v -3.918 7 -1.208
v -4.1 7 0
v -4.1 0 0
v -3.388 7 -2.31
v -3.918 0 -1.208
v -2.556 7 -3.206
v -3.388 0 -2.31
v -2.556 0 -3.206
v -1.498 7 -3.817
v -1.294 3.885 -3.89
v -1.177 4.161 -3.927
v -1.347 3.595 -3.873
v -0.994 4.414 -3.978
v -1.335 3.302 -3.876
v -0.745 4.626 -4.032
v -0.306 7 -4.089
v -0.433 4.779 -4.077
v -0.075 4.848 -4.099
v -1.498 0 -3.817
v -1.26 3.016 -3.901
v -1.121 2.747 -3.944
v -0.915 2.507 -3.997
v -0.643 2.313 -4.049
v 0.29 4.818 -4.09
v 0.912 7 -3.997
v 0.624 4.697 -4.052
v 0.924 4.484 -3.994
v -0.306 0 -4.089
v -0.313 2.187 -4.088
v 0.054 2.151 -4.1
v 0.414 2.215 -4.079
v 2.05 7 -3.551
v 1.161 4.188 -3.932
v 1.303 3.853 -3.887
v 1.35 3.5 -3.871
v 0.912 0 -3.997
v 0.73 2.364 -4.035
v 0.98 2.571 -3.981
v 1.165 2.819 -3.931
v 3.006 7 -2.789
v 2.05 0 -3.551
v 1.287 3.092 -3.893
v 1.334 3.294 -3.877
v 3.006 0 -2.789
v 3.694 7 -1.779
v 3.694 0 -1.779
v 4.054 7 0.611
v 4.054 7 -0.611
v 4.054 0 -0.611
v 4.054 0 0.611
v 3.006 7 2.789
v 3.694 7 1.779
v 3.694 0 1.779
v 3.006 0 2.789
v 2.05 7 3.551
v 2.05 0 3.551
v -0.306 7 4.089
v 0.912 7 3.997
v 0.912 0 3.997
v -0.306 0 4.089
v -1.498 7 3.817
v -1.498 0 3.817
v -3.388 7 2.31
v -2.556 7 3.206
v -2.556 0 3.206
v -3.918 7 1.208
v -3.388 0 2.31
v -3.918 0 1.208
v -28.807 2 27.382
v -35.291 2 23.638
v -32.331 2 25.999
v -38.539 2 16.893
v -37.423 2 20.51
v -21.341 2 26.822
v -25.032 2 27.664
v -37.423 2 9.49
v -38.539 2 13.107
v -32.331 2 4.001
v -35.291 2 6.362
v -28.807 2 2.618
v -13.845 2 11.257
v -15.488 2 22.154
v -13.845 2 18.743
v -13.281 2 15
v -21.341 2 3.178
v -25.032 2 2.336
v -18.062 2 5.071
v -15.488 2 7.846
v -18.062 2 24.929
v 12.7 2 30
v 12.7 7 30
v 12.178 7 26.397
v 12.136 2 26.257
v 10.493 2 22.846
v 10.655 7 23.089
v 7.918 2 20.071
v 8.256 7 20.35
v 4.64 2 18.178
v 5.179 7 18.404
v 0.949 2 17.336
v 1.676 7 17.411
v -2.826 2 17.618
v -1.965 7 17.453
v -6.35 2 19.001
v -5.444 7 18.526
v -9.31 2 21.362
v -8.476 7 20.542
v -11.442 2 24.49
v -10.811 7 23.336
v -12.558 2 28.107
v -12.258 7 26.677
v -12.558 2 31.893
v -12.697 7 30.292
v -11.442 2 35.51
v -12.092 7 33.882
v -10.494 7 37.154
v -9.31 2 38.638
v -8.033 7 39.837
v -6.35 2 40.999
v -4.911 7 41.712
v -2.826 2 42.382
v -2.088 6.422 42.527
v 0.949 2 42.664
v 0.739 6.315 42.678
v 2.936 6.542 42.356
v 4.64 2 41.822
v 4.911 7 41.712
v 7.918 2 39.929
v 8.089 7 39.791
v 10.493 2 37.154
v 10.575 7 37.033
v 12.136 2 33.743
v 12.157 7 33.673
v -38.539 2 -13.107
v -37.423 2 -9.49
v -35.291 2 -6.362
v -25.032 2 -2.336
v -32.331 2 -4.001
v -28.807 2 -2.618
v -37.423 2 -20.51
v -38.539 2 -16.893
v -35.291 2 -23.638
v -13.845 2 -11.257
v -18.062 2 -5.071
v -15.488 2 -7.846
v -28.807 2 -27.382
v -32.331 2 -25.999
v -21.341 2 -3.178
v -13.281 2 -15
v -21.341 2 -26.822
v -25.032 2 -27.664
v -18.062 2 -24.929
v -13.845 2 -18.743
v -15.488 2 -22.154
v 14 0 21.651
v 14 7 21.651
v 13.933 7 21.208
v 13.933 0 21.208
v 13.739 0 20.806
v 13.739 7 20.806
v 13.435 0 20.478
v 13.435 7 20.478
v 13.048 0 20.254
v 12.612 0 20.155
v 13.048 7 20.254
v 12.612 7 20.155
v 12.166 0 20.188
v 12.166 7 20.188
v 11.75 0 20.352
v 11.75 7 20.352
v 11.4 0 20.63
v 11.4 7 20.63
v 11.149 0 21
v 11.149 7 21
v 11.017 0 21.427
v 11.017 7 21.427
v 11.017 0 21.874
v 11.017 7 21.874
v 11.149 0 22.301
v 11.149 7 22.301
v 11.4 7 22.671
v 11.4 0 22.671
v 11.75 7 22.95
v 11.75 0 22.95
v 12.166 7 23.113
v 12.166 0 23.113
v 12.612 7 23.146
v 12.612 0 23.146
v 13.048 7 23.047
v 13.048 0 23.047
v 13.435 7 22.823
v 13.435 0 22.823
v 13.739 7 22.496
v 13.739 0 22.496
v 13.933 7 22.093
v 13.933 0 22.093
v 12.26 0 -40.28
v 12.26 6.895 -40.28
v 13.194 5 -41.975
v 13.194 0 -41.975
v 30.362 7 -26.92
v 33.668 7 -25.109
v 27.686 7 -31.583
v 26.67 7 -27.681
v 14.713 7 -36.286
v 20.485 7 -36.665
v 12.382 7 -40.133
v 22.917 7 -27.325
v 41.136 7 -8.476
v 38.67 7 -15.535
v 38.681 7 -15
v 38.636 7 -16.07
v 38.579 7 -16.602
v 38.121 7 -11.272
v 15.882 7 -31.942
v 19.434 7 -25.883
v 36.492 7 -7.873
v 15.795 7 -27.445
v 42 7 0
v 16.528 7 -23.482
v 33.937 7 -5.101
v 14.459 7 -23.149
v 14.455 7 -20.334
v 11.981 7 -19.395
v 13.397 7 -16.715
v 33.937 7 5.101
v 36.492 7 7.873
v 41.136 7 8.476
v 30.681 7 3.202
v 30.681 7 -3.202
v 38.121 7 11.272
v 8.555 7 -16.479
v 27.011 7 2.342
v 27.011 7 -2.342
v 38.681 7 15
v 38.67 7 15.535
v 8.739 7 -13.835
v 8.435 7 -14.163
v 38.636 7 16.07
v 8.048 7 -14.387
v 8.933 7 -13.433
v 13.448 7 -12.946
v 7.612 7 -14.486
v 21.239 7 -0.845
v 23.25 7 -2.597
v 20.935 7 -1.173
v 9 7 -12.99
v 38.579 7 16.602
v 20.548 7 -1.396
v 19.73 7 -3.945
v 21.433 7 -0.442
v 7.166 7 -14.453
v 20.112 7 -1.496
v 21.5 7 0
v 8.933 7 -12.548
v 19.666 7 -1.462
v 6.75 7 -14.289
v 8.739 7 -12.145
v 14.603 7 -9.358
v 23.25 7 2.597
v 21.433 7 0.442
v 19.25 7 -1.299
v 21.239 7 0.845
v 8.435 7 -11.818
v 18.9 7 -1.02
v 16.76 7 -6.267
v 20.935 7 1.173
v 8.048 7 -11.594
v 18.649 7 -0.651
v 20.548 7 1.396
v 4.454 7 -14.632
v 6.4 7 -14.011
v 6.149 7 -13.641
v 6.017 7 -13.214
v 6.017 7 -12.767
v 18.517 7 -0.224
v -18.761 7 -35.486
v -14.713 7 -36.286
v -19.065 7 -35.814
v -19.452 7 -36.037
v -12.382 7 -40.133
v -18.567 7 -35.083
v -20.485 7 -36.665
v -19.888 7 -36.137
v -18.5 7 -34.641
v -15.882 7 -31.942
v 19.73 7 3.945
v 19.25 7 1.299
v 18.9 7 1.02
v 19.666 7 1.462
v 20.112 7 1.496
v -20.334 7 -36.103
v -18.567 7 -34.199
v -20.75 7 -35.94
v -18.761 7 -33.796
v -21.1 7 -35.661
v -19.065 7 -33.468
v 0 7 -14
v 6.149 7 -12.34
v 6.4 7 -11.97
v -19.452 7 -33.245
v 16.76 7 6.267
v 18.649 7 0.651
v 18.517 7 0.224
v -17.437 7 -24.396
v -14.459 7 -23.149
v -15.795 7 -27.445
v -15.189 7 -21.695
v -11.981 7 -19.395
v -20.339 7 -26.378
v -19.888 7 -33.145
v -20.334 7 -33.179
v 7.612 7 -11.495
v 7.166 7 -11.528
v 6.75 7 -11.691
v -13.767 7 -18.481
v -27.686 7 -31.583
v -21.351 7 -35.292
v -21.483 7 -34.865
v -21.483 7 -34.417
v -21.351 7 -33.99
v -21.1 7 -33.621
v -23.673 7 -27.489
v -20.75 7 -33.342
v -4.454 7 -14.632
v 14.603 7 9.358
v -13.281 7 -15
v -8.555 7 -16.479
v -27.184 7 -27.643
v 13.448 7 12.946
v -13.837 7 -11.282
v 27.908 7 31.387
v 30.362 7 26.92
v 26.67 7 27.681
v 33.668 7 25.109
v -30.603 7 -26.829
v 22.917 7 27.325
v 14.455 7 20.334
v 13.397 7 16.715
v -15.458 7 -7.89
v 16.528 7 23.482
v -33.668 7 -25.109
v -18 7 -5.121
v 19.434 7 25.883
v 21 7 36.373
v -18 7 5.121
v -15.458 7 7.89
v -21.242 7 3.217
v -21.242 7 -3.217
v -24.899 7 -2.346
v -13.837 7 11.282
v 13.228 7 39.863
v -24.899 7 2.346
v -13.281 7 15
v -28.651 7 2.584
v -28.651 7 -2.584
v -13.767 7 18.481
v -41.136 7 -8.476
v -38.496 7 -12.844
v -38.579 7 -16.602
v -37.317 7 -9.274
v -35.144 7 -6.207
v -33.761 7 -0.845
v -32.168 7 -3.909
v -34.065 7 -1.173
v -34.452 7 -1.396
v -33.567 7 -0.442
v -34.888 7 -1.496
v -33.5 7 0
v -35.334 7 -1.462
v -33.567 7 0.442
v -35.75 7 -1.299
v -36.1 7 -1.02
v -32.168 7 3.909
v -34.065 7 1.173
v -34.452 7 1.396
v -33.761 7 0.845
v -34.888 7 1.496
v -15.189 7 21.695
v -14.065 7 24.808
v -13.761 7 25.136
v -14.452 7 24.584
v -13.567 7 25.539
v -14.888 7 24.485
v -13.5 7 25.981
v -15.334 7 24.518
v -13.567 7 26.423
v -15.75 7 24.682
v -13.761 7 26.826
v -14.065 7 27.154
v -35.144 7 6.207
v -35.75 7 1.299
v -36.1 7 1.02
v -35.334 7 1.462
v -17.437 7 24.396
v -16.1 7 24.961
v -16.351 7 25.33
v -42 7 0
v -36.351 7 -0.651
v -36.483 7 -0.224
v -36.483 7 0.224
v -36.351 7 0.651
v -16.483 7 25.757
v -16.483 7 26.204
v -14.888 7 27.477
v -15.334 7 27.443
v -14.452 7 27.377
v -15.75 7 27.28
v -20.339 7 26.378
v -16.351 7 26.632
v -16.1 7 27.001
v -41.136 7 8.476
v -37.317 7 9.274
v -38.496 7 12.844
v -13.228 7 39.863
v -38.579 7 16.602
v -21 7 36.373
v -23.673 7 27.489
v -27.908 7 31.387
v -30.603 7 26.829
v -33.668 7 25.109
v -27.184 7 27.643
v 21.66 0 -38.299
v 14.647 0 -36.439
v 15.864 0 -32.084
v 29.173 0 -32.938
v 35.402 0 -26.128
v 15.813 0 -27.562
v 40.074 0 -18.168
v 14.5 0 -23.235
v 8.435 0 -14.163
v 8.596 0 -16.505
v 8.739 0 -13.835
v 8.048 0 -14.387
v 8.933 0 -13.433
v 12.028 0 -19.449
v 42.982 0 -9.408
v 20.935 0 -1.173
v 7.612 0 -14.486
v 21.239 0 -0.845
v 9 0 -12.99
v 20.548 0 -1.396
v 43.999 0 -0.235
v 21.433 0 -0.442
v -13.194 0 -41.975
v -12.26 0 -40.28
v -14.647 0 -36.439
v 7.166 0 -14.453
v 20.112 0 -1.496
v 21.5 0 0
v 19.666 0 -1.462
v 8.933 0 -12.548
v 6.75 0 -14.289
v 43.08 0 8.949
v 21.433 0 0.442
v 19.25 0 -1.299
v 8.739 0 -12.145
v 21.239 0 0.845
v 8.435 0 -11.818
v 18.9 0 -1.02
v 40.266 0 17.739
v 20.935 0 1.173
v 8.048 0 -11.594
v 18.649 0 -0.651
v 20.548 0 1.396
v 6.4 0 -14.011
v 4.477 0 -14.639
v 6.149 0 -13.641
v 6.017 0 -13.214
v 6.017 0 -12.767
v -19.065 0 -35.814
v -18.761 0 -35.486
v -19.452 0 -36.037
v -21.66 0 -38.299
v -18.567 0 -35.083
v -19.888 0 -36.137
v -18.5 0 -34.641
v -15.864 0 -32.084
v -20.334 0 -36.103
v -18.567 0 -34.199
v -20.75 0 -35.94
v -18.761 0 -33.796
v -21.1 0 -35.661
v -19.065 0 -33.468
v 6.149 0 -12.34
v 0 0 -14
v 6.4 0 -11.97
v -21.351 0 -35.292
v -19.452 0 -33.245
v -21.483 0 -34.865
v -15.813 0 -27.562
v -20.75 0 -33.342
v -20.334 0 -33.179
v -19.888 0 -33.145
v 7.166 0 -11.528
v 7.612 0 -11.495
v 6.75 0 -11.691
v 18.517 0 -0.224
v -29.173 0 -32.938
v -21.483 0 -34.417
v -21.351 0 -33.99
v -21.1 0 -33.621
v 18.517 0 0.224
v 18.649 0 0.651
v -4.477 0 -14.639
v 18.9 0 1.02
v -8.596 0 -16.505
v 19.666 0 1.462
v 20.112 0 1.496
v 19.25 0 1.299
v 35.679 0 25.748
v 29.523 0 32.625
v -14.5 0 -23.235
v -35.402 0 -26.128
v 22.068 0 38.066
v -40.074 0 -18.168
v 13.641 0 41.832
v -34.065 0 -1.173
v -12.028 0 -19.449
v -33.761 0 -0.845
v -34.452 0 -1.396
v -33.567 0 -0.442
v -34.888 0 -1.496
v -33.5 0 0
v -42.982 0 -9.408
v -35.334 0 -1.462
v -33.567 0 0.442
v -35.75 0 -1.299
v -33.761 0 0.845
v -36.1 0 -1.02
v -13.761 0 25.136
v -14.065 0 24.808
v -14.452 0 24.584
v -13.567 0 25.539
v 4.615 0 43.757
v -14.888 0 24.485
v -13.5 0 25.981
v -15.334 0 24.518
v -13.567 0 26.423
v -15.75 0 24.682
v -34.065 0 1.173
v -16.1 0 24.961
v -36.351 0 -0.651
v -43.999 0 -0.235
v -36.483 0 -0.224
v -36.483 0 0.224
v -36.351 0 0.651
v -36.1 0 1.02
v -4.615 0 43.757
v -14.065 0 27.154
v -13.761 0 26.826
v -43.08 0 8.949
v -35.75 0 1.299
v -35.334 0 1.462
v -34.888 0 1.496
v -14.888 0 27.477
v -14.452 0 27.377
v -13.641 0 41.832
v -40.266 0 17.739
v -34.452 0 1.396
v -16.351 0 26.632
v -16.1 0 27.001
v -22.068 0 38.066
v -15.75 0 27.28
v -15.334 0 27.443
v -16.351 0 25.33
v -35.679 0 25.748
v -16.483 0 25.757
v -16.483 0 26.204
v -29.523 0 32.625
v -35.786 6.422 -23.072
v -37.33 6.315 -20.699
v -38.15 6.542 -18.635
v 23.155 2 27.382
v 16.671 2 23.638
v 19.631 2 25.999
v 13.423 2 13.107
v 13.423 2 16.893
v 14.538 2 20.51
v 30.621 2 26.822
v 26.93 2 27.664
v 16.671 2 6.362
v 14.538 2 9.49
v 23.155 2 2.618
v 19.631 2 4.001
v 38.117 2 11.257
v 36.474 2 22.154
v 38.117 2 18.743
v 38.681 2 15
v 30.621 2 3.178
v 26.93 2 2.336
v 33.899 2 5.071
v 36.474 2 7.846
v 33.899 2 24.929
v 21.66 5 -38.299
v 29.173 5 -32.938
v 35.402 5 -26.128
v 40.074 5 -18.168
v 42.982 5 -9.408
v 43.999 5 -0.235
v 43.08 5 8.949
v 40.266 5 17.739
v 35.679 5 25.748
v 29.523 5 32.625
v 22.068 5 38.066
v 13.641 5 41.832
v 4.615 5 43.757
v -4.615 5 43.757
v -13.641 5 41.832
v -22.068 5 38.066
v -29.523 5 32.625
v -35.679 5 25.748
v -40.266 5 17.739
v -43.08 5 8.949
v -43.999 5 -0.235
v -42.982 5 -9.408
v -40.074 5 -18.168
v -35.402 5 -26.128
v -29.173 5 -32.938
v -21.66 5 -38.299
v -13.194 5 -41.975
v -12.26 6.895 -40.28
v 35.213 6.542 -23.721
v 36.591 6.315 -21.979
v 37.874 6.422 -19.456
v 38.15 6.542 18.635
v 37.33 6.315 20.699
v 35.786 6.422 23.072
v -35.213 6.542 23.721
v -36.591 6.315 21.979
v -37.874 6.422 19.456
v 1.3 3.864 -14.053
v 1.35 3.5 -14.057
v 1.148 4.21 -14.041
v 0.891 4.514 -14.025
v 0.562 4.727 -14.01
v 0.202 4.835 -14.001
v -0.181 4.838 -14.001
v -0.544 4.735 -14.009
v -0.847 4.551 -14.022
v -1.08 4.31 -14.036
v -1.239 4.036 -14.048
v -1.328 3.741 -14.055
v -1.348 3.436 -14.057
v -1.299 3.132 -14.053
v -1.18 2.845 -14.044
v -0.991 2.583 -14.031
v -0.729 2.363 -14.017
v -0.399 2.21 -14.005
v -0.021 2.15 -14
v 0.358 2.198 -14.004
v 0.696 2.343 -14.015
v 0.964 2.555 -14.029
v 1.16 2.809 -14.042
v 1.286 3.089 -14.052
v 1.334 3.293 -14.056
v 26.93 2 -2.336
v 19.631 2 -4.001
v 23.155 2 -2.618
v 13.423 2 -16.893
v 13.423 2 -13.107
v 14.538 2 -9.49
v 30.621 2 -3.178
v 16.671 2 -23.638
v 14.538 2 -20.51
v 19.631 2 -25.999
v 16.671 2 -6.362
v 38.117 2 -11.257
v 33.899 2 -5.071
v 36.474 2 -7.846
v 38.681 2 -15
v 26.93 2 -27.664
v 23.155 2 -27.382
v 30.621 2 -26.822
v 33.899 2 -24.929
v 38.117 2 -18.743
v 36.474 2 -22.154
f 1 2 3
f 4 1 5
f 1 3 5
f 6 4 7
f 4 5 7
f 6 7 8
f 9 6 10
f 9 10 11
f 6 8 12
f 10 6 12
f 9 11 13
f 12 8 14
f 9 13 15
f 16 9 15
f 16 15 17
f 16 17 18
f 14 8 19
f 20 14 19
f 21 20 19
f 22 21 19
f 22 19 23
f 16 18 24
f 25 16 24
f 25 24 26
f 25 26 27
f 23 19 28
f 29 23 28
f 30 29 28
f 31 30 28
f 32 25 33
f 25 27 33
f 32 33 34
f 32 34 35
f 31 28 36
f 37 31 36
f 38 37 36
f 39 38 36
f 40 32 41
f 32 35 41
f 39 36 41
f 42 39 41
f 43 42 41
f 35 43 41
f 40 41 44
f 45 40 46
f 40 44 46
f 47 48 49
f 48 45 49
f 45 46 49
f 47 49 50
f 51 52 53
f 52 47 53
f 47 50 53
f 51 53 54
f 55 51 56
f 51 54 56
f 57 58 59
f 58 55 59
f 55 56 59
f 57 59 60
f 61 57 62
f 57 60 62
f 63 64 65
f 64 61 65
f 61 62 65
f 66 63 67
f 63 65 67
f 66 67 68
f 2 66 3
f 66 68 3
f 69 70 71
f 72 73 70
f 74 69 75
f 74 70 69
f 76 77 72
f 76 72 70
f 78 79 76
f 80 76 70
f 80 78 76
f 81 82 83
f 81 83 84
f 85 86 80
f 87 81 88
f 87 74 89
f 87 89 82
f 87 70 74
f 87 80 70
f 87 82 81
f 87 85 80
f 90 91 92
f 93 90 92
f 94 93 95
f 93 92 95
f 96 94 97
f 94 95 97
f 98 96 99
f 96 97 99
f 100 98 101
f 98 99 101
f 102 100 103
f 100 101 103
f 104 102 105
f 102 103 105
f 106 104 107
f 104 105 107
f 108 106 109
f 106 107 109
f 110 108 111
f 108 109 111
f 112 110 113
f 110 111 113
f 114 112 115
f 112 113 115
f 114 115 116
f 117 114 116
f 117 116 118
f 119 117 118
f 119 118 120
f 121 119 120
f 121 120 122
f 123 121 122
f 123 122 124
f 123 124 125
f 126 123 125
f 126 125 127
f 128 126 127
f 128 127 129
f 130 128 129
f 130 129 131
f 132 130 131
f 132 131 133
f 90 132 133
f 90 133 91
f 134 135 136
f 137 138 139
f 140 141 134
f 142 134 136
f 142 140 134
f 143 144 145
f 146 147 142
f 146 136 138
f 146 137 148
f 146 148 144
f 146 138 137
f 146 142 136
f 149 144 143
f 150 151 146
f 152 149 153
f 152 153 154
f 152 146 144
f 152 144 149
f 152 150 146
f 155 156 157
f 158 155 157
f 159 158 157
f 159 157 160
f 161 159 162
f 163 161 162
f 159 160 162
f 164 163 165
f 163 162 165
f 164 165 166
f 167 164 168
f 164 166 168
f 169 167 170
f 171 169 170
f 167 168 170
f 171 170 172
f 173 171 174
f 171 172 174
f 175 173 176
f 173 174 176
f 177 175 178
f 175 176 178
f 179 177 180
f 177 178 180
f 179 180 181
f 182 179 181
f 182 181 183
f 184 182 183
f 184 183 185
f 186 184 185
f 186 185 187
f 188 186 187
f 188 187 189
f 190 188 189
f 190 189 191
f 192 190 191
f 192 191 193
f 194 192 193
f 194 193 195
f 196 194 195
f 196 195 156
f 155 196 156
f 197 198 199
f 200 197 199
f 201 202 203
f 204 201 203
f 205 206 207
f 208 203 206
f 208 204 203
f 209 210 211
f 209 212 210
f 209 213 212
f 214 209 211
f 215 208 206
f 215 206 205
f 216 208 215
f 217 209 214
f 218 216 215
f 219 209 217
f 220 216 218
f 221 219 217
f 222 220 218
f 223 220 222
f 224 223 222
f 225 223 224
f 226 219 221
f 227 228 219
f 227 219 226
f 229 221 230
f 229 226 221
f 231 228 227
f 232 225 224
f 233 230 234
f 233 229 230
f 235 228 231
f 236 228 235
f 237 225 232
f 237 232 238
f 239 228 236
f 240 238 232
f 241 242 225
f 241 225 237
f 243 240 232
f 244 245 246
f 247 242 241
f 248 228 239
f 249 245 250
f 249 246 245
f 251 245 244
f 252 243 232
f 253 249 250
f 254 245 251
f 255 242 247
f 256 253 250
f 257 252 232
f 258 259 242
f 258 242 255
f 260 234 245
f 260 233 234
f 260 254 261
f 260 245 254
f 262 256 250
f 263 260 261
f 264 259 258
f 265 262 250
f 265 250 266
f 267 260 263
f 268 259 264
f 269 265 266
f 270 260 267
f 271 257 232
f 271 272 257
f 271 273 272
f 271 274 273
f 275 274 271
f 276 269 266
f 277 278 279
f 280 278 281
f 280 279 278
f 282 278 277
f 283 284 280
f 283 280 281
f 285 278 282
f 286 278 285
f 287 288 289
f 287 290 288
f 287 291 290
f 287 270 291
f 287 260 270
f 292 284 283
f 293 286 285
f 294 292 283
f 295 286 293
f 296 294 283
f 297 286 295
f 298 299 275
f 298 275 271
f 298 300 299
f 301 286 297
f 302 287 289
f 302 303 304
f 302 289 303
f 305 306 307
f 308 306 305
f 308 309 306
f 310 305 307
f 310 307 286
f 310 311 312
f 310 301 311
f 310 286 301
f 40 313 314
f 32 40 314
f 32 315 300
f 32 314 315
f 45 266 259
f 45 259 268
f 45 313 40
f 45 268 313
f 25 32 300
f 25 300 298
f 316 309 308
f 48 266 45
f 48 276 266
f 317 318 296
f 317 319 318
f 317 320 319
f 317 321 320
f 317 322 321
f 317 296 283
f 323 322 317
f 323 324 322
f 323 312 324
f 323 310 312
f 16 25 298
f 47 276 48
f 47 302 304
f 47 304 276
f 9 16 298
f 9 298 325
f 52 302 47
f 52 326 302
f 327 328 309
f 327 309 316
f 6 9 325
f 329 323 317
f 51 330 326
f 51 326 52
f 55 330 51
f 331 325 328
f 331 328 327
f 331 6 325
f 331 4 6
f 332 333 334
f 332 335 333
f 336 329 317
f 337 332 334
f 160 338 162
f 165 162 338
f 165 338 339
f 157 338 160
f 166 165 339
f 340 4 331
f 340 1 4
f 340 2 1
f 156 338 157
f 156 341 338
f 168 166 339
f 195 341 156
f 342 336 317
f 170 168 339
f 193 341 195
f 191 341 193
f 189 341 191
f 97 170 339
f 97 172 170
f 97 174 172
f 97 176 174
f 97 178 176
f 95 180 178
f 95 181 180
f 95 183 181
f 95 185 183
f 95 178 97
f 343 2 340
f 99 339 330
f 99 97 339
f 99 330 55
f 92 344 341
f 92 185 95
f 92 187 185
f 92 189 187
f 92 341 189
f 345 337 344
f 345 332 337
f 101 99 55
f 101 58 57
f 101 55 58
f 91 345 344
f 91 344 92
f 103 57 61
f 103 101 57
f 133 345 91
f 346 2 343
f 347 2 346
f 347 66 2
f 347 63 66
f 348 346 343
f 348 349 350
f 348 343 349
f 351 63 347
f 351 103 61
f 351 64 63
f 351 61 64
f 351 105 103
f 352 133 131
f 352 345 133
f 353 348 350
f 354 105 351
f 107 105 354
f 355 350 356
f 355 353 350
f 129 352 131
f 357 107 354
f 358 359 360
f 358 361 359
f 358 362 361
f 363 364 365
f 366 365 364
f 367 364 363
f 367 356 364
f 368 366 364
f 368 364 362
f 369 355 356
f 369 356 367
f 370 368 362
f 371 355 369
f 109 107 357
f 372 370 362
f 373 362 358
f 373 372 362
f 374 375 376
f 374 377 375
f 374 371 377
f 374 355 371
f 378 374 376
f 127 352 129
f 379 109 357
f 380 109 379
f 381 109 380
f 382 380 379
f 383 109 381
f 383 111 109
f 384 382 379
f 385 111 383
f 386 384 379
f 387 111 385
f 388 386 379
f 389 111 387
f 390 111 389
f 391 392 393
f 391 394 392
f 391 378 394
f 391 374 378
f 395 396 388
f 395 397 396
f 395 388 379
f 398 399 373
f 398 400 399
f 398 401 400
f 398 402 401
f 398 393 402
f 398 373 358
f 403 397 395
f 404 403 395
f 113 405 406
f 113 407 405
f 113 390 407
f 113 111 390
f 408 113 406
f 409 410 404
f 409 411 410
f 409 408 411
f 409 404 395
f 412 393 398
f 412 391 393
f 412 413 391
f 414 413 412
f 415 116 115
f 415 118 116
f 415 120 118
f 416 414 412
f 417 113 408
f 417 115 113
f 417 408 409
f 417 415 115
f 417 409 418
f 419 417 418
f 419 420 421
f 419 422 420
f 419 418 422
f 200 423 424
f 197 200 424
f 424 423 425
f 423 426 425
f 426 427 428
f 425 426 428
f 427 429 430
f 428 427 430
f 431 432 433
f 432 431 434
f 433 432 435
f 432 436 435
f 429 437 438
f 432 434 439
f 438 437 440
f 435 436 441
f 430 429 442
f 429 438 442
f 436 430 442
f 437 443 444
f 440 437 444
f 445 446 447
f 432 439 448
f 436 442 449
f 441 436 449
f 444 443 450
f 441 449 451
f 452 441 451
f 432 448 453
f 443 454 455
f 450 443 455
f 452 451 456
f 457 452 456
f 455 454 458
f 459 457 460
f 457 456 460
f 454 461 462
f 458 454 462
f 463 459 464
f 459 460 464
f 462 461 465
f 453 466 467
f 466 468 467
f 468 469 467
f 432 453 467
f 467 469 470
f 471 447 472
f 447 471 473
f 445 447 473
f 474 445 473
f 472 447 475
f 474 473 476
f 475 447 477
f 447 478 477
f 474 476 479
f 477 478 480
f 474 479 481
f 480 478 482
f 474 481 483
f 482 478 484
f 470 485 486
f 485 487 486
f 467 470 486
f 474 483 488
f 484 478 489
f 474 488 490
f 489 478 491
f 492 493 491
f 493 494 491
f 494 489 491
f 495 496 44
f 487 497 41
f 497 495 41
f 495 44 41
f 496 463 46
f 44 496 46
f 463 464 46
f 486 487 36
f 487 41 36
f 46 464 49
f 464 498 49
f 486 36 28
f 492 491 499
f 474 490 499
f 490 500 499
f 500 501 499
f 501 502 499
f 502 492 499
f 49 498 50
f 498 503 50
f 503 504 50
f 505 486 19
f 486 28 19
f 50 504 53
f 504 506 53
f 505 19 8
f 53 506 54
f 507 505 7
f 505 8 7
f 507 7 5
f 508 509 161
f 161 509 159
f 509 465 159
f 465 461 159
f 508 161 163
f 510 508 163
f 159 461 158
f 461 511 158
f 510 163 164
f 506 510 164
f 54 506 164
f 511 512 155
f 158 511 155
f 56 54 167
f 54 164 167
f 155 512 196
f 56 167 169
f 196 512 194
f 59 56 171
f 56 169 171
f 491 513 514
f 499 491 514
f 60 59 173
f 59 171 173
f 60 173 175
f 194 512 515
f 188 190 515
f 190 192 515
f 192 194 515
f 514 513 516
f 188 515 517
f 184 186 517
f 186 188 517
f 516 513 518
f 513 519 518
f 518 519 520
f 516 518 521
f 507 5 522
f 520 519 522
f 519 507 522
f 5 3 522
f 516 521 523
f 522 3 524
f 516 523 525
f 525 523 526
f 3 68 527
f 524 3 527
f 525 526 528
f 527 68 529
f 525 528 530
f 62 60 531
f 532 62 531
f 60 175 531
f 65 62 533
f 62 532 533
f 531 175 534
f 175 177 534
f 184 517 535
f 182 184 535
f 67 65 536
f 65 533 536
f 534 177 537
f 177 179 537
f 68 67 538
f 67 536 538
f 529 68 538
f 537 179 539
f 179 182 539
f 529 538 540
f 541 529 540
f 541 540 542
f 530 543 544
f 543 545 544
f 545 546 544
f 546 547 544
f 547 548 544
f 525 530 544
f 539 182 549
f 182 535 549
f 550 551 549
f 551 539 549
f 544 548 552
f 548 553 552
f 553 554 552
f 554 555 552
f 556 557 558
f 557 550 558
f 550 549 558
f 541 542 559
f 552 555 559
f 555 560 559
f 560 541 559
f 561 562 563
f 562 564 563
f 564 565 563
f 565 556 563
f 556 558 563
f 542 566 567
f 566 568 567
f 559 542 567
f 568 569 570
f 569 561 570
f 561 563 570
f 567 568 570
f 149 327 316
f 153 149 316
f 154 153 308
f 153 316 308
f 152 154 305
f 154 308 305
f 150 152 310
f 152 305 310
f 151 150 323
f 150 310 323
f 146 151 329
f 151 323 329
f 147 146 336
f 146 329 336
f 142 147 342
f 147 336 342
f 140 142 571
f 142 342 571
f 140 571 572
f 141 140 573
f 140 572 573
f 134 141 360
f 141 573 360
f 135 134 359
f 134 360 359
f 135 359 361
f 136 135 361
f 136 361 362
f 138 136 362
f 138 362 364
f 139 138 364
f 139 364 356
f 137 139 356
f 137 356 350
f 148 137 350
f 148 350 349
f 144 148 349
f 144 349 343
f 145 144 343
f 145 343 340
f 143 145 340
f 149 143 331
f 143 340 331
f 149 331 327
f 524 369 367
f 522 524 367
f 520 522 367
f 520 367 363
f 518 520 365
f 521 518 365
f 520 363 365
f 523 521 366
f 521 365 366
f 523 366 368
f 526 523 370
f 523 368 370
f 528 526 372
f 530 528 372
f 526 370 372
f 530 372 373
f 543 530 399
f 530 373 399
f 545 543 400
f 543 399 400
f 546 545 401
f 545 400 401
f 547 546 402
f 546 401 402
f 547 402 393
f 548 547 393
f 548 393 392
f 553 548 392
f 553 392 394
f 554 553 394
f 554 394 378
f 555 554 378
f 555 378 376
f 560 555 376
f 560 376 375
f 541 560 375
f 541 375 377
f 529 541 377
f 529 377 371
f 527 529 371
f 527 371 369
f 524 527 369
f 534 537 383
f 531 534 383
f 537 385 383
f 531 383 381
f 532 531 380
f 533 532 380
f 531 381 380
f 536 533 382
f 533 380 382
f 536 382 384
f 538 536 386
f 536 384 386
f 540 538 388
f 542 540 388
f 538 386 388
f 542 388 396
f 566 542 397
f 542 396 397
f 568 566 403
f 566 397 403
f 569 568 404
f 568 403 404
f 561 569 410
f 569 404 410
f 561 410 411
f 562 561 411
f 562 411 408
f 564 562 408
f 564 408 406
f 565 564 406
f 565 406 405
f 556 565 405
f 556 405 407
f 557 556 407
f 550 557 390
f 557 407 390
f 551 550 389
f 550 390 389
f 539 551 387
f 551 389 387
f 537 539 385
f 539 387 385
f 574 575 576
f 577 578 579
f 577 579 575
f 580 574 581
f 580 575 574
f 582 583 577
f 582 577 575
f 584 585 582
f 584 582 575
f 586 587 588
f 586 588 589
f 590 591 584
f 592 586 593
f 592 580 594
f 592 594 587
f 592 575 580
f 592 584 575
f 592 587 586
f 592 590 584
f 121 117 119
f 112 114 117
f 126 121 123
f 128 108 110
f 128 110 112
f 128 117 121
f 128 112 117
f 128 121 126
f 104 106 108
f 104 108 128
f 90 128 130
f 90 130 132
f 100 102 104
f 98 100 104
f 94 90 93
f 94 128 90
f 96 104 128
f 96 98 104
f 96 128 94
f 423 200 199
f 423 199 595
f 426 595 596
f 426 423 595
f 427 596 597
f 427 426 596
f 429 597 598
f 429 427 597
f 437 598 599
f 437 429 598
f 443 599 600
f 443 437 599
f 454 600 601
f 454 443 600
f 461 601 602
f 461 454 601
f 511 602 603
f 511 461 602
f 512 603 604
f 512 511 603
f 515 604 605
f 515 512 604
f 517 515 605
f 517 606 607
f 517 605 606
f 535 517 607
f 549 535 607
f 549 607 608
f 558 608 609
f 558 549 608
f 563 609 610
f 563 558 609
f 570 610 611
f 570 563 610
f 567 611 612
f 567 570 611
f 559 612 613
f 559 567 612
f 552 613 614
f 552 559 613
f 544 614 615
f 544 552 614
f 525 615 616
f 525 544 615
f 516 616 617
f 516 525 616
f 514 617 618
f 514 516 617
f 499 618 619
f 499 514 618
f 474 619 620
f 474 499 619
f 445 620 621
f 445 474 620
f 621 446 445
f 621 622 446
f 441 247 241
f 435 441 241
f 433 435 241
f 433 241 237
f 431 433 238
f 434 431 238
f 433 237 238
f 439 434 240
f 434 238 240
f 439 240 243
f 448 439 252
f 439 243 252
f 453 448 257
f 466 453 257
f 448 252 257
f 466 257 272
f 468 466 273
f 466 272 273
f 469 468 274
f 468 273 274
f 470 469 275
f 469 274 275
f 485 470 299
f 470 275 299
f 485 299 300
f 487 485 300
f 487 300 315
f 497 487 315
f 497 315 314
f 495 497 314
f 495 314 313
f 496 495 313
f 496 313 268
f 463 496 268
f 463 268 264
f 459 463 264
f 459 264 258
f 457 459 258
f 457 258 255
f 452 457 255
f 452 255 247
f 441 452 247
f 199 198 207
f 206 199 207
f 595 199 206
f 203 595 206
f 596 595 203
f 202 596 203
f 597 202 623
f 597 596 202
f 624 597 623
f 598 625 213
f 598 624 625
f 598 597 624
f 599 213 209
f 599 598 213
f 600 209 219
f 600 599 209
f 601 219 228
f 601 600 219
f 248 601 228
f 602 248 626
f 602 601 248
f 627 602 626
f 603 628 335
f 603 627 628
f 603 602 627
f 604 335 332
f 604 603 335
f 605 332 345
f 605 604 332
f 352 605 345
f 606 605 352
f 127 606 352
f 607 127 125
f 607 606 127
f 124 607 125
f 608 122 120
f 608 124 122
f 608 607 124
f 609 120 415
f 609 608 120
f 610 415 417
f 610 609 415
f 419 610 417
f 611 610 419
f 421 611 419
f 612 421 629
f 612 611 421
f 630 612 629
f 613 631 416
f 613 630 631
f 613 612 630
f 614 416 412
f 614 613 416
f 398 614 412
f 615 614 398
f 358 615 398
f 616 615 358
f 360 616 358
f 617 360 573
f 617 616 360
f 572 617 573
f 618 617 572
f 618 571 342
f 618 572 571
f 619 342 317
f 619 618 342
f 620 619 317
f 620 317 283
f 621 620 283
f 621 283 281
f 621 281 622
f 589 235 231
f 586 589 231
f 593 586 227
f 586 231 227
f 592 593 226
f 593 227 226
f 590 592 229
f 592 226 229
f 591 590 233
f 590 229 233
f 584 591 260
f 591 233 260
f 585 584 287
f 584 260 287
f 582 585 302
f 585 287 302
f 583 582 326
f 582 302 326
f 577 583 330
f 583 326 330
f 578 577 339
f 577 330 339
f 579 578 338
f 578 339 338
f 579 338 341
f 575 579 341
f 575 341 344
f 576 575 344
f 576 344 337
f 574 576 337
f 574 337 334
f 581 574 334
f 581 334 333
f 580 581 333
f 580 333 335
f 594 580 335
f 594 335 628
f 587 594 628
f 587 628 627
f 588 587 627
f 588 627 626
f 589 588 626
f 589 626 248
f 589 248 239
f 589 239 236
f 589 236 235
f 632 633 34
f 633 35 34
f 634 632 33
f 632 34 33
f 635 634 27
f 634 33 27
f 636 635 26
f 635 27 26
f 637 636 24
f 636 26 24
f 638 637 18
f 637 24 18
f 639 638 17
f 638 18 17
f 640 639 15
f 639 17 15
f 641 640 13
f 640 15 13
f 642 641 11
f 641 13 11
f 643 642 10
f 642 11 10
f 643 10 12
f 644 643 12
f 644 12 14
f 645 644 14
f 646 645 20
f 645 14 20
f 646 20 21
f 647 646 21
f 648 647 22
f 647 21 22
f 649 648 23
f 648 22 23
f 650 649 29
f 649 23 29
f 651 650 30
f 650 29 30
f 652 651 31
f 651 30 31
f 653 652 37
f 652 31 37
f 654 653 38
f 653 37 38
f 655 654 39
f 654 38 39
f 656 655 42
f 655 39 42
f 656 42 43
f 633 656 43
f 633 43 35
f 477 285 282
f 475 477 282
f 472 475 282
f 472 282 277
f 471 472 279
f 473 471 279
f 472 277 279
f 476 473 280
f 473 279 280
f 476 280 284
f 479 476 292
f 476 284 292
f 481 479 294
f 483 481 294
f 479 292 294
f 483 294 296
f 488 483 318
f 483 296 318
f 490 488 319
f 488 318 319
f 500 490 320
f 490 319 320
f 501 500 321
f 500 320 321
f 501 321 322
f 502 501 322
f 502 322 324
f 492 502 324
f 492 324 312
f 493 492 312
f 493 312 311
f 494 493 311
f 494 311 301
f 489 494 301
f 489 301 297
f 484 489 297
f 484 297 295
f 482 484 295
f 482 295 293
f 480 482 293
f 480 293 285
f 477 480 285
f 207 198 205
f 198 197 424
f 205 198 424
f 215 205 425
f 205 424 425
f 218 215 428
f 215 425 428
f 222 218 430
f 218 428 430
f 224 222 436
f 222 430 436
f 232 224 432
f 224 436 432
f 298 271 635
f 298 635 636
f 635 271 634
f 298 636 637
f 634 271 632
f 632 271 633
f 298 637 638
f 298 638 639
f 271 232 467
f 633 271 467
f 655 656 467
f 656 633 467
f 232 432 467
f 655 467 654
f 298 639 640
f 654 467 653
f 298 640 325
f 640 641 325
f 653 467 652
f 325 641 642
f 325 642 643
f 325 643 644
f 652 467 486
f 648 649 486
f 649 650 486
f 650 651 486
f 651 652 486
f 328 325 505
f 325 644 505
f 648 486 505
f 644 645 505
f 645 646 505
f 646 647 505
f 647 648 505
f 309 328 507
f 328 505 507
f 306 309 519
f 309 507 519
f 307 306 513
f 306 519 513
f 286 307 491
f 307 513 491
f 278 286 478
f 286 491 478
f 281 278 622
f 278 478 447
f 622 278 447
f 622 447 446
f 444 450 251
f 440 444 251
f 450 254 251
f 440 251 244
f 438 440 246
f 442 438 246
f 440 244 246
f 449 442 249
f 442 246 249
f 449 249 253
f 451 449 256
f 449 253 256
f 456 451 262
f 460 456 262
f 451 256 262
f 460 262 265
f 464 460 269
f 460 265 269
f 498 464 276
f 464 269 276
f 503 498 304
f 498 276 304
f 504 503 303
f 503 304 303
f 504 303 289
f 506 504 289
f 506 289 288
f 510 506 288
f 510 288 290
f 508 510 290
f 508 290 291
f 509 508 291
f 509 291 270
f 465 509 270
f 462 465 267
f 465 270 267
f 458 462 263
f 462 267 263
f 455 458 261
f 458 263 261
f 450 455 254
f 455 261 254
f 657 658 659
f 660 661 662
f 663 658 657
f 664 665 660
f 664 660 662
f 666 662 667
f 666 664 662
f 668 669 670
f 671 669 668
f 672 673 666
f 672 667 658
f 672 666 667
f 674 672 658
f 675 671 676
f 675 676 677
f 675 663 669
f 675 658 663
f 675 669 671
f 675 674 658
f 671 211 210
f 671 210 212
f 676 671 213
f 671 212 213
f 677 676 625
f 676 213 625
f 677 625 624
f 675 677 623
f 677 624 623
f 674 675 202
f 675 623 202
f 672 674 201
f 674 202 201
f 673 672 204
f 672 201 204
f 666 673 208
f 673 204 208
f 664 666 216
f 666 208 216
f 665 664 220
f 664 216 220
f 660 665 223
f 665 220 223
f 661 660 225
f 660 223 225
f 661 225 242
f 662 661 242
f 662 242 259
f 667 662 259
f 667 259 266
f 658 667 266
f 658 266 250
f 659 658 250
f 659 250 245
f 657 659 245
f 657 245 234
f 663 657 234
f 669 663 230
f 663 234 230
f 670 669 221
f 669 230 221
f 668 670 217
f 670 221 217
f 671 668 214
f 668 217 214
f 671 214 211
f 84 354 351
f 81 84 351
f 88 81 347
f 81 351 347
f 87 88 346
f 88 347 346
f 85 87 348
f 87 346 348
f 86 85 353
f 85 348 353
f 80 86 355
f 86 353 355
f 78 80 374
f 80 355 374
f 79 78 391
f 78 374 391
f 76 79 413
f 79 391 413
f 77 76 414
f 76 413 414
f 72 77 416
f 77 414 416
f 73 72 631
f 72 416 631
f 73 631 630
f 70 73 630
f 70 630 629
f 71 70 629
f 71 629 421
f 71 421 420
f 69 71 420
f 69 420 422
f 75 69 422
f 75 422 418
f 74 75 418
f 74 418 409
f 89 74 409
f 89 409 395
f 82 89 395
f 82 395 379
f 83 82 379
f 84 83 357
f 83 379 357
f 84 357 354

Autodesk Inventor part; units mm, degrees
ref_plane "YZ Plane" through (0, 0, 0) normal (1, 0, 0) x (0, 1, 0)
ref_plane "XZ Plane" through (0, 0, 0) normal (0, 1, 0) x (-1, 0, 0)
ref_plane "XY Plane" through (0, 0, 0) normal (0, 0, 1) x (1, 0, 0)
sketch "Sketch1" plane through (0, 0, 0) normal (0, 1, 0) x (-1, 0, 0)
  circle A0 centre (0, 0) radius 44 construction
  circle A1 centre (0, 0) radius 4.1
  line L0 (0, -30) -> (-25.9808, -15) construction
  line L1 (-25.9808, -15) -> (-25.9808, 15) construction
  line L2 (-25.9808, 15) -> (0, 30) construction
  line L3 (0, 30) -> (25.9808, 15) construction
  line L4 (25.9808, 15) -> (25.9808, -15) construction
  line L5 (25.9808, -15) -> (0, -30) construction
  circle A2 centre (0, -30) radius 12.7 construction
  circle A3 centre (0, -30) radius 16 construction
  circle A4 centre (25.9808, -15) radius 12.7 construction
  arc A5 (9.3274, -43) -> (-9.3274, -43) centre (0, -30) ccw construction
  arc A6 (9.3274, -43) -> (-9.3274, -43) centre (0, 0) ccw
  line L6 (0, -64) -> (0, 62) projected
  arc A7 (9.3274, -43) -> (-9.3274, -43) centre (0, -30) ccw
  dimension "d0" = 88
  dimension "d4" = 32
  dimension "d1" = 8.2
  dimension "d2" = 25.4
  dimension "d3" = 30
  dimension "d5" = 25.4
extrude "Extrusion1" add sketch "Sketch1" along normal blind 7 contours A1 L6 A6 A7 | A1 L6 A7 A6
sketch "Sketch2" plane through (0, 7, 0) normal (0, 1, 0) x (1, 0, 0)
  arc A0 (-9.3274, 43) -> (9.3274, 43) centre (0, 30) ccw construction
  line L0 (0, 30) -> (25.9808, 15) construction
  line L1 (25.9808, 15) -> (25.9808, -15) construction
  line L2 (25.9808, -15) -> (0, -30) construction
  line L3 (0, -30) -> (-25.9808, -15) construction
  line L4 (-25.9808, -15) -> (-25.9808, 15) construction
  line L5 (-25.9808, 15) -> (0, 30) construction
  circle A1 centre (-25.9808, 15) radius 12.7
  circle A2 centre (-25.9808, -15) radius 12.7
  circle A3 centre (0, -30) radius 12.7
  circle A4 centre (25.9808, -15) radius 12.7
  circle A5 centre (25.9808, 15) radius 12.7
  point P0 (0, 0)
  point P1 (0, 0)
  dimension "d8" = 25.4
extrude "Extrusion2" cut sketch "Sketch2" against normal blind 5
chamfer "Chamfer1" distance 2 angle 45 1 edges at (0, 7, 44)
chamfer "Chamfer2" distance 4 angle 45 2 edges at (-9.3274, 2.5, -43) (9.3274, 2.5, -43)
sketch "Sketch3" plane through (0, 0, 0) normal (0, 0, 1) x (1, 0, 0)
  circle A0 centre (0, 3.5) radius 1.35
  line L0 (-16, 0) -> (16, 0) projected
  point P0 (0, 0)
  point P1 (12.2604, 0)
  point P2 (-12.2604, 0)
  dimension "d17" = 3.5
  dimension "d18" = 2.7
extrude "Extrusion3" cut sketch "Sketch3" against normal through all
sketch "Sketch4" plane through (0, 7, 0) normal (0, 1, 0) x (1, 0, 0)
  circle A0 centre (-25.9808, 15) radius 12.7 construction
  arc A1 (-33.6678, -25.1094) -> (-38.5793, -16.6024) centre (-25.9808, -15) ccw construction
  arc A2 (4.9115, -41.7118) -> (-4.9115, -41.7118) centre (0, -30) ccw construction
  arc A3 (38.5793, -16.6024) -> (33.6678, -25.1094) centre (25.9808, -15) ccw construction
  arc A4 (33.6678, 25.1094) -> (38.5793, 16.6024) centre (25.9808, 15) ccw construction
  circle A5 centre (0, 0) radius 4.1 construction
  line L0 (0, 0) -> (0, -30) construction
  circle A6 centre (0, 0) radius 40 construction
  circle A7 centre (0, 0) radius 35 construction
  circle A8 centre (0, 0) radius 30 construction
  circle A9 centre (0, 0) radius 25 construction
  circle A10 centre (0, 0) radius 20 construction
  circle A11 centre (0, 0) radius 15 construction
  line L1 (61.6, 0) -> (-61.6, 0) construction
  circle A12 centre (7.5, 12.9904) radius 1.5
  circle A13 centre (-20, 34.641) radius 1.5
  circle A14 centre (-35, 0) radius 1.5
  circle A15 centre (-15, -25.9808) radius 1.5
  circle A16 centre (12.5, -21.6506) radius 1.5
  circle A17 centre (20, 0) radius 1.5
  line L2 (0, 59.1703) -> (0, -61.195) construction
  dimension "d28" = 80
  dimension "d29" = 70
  dimension "d30" = 60
  dimension "d31" = 50
  dimension "d32" = 40
  dimension "d38" = 30
  dimension "d45" = 3
  dimension "d46" = 60
  dimension "d47" = 60
  dimension "d48" = 60
  dimension "d49" = 60
extrude "Extrusion4" cut sketch "Sketch4" against normal through all
properties part number "carousel_print"
